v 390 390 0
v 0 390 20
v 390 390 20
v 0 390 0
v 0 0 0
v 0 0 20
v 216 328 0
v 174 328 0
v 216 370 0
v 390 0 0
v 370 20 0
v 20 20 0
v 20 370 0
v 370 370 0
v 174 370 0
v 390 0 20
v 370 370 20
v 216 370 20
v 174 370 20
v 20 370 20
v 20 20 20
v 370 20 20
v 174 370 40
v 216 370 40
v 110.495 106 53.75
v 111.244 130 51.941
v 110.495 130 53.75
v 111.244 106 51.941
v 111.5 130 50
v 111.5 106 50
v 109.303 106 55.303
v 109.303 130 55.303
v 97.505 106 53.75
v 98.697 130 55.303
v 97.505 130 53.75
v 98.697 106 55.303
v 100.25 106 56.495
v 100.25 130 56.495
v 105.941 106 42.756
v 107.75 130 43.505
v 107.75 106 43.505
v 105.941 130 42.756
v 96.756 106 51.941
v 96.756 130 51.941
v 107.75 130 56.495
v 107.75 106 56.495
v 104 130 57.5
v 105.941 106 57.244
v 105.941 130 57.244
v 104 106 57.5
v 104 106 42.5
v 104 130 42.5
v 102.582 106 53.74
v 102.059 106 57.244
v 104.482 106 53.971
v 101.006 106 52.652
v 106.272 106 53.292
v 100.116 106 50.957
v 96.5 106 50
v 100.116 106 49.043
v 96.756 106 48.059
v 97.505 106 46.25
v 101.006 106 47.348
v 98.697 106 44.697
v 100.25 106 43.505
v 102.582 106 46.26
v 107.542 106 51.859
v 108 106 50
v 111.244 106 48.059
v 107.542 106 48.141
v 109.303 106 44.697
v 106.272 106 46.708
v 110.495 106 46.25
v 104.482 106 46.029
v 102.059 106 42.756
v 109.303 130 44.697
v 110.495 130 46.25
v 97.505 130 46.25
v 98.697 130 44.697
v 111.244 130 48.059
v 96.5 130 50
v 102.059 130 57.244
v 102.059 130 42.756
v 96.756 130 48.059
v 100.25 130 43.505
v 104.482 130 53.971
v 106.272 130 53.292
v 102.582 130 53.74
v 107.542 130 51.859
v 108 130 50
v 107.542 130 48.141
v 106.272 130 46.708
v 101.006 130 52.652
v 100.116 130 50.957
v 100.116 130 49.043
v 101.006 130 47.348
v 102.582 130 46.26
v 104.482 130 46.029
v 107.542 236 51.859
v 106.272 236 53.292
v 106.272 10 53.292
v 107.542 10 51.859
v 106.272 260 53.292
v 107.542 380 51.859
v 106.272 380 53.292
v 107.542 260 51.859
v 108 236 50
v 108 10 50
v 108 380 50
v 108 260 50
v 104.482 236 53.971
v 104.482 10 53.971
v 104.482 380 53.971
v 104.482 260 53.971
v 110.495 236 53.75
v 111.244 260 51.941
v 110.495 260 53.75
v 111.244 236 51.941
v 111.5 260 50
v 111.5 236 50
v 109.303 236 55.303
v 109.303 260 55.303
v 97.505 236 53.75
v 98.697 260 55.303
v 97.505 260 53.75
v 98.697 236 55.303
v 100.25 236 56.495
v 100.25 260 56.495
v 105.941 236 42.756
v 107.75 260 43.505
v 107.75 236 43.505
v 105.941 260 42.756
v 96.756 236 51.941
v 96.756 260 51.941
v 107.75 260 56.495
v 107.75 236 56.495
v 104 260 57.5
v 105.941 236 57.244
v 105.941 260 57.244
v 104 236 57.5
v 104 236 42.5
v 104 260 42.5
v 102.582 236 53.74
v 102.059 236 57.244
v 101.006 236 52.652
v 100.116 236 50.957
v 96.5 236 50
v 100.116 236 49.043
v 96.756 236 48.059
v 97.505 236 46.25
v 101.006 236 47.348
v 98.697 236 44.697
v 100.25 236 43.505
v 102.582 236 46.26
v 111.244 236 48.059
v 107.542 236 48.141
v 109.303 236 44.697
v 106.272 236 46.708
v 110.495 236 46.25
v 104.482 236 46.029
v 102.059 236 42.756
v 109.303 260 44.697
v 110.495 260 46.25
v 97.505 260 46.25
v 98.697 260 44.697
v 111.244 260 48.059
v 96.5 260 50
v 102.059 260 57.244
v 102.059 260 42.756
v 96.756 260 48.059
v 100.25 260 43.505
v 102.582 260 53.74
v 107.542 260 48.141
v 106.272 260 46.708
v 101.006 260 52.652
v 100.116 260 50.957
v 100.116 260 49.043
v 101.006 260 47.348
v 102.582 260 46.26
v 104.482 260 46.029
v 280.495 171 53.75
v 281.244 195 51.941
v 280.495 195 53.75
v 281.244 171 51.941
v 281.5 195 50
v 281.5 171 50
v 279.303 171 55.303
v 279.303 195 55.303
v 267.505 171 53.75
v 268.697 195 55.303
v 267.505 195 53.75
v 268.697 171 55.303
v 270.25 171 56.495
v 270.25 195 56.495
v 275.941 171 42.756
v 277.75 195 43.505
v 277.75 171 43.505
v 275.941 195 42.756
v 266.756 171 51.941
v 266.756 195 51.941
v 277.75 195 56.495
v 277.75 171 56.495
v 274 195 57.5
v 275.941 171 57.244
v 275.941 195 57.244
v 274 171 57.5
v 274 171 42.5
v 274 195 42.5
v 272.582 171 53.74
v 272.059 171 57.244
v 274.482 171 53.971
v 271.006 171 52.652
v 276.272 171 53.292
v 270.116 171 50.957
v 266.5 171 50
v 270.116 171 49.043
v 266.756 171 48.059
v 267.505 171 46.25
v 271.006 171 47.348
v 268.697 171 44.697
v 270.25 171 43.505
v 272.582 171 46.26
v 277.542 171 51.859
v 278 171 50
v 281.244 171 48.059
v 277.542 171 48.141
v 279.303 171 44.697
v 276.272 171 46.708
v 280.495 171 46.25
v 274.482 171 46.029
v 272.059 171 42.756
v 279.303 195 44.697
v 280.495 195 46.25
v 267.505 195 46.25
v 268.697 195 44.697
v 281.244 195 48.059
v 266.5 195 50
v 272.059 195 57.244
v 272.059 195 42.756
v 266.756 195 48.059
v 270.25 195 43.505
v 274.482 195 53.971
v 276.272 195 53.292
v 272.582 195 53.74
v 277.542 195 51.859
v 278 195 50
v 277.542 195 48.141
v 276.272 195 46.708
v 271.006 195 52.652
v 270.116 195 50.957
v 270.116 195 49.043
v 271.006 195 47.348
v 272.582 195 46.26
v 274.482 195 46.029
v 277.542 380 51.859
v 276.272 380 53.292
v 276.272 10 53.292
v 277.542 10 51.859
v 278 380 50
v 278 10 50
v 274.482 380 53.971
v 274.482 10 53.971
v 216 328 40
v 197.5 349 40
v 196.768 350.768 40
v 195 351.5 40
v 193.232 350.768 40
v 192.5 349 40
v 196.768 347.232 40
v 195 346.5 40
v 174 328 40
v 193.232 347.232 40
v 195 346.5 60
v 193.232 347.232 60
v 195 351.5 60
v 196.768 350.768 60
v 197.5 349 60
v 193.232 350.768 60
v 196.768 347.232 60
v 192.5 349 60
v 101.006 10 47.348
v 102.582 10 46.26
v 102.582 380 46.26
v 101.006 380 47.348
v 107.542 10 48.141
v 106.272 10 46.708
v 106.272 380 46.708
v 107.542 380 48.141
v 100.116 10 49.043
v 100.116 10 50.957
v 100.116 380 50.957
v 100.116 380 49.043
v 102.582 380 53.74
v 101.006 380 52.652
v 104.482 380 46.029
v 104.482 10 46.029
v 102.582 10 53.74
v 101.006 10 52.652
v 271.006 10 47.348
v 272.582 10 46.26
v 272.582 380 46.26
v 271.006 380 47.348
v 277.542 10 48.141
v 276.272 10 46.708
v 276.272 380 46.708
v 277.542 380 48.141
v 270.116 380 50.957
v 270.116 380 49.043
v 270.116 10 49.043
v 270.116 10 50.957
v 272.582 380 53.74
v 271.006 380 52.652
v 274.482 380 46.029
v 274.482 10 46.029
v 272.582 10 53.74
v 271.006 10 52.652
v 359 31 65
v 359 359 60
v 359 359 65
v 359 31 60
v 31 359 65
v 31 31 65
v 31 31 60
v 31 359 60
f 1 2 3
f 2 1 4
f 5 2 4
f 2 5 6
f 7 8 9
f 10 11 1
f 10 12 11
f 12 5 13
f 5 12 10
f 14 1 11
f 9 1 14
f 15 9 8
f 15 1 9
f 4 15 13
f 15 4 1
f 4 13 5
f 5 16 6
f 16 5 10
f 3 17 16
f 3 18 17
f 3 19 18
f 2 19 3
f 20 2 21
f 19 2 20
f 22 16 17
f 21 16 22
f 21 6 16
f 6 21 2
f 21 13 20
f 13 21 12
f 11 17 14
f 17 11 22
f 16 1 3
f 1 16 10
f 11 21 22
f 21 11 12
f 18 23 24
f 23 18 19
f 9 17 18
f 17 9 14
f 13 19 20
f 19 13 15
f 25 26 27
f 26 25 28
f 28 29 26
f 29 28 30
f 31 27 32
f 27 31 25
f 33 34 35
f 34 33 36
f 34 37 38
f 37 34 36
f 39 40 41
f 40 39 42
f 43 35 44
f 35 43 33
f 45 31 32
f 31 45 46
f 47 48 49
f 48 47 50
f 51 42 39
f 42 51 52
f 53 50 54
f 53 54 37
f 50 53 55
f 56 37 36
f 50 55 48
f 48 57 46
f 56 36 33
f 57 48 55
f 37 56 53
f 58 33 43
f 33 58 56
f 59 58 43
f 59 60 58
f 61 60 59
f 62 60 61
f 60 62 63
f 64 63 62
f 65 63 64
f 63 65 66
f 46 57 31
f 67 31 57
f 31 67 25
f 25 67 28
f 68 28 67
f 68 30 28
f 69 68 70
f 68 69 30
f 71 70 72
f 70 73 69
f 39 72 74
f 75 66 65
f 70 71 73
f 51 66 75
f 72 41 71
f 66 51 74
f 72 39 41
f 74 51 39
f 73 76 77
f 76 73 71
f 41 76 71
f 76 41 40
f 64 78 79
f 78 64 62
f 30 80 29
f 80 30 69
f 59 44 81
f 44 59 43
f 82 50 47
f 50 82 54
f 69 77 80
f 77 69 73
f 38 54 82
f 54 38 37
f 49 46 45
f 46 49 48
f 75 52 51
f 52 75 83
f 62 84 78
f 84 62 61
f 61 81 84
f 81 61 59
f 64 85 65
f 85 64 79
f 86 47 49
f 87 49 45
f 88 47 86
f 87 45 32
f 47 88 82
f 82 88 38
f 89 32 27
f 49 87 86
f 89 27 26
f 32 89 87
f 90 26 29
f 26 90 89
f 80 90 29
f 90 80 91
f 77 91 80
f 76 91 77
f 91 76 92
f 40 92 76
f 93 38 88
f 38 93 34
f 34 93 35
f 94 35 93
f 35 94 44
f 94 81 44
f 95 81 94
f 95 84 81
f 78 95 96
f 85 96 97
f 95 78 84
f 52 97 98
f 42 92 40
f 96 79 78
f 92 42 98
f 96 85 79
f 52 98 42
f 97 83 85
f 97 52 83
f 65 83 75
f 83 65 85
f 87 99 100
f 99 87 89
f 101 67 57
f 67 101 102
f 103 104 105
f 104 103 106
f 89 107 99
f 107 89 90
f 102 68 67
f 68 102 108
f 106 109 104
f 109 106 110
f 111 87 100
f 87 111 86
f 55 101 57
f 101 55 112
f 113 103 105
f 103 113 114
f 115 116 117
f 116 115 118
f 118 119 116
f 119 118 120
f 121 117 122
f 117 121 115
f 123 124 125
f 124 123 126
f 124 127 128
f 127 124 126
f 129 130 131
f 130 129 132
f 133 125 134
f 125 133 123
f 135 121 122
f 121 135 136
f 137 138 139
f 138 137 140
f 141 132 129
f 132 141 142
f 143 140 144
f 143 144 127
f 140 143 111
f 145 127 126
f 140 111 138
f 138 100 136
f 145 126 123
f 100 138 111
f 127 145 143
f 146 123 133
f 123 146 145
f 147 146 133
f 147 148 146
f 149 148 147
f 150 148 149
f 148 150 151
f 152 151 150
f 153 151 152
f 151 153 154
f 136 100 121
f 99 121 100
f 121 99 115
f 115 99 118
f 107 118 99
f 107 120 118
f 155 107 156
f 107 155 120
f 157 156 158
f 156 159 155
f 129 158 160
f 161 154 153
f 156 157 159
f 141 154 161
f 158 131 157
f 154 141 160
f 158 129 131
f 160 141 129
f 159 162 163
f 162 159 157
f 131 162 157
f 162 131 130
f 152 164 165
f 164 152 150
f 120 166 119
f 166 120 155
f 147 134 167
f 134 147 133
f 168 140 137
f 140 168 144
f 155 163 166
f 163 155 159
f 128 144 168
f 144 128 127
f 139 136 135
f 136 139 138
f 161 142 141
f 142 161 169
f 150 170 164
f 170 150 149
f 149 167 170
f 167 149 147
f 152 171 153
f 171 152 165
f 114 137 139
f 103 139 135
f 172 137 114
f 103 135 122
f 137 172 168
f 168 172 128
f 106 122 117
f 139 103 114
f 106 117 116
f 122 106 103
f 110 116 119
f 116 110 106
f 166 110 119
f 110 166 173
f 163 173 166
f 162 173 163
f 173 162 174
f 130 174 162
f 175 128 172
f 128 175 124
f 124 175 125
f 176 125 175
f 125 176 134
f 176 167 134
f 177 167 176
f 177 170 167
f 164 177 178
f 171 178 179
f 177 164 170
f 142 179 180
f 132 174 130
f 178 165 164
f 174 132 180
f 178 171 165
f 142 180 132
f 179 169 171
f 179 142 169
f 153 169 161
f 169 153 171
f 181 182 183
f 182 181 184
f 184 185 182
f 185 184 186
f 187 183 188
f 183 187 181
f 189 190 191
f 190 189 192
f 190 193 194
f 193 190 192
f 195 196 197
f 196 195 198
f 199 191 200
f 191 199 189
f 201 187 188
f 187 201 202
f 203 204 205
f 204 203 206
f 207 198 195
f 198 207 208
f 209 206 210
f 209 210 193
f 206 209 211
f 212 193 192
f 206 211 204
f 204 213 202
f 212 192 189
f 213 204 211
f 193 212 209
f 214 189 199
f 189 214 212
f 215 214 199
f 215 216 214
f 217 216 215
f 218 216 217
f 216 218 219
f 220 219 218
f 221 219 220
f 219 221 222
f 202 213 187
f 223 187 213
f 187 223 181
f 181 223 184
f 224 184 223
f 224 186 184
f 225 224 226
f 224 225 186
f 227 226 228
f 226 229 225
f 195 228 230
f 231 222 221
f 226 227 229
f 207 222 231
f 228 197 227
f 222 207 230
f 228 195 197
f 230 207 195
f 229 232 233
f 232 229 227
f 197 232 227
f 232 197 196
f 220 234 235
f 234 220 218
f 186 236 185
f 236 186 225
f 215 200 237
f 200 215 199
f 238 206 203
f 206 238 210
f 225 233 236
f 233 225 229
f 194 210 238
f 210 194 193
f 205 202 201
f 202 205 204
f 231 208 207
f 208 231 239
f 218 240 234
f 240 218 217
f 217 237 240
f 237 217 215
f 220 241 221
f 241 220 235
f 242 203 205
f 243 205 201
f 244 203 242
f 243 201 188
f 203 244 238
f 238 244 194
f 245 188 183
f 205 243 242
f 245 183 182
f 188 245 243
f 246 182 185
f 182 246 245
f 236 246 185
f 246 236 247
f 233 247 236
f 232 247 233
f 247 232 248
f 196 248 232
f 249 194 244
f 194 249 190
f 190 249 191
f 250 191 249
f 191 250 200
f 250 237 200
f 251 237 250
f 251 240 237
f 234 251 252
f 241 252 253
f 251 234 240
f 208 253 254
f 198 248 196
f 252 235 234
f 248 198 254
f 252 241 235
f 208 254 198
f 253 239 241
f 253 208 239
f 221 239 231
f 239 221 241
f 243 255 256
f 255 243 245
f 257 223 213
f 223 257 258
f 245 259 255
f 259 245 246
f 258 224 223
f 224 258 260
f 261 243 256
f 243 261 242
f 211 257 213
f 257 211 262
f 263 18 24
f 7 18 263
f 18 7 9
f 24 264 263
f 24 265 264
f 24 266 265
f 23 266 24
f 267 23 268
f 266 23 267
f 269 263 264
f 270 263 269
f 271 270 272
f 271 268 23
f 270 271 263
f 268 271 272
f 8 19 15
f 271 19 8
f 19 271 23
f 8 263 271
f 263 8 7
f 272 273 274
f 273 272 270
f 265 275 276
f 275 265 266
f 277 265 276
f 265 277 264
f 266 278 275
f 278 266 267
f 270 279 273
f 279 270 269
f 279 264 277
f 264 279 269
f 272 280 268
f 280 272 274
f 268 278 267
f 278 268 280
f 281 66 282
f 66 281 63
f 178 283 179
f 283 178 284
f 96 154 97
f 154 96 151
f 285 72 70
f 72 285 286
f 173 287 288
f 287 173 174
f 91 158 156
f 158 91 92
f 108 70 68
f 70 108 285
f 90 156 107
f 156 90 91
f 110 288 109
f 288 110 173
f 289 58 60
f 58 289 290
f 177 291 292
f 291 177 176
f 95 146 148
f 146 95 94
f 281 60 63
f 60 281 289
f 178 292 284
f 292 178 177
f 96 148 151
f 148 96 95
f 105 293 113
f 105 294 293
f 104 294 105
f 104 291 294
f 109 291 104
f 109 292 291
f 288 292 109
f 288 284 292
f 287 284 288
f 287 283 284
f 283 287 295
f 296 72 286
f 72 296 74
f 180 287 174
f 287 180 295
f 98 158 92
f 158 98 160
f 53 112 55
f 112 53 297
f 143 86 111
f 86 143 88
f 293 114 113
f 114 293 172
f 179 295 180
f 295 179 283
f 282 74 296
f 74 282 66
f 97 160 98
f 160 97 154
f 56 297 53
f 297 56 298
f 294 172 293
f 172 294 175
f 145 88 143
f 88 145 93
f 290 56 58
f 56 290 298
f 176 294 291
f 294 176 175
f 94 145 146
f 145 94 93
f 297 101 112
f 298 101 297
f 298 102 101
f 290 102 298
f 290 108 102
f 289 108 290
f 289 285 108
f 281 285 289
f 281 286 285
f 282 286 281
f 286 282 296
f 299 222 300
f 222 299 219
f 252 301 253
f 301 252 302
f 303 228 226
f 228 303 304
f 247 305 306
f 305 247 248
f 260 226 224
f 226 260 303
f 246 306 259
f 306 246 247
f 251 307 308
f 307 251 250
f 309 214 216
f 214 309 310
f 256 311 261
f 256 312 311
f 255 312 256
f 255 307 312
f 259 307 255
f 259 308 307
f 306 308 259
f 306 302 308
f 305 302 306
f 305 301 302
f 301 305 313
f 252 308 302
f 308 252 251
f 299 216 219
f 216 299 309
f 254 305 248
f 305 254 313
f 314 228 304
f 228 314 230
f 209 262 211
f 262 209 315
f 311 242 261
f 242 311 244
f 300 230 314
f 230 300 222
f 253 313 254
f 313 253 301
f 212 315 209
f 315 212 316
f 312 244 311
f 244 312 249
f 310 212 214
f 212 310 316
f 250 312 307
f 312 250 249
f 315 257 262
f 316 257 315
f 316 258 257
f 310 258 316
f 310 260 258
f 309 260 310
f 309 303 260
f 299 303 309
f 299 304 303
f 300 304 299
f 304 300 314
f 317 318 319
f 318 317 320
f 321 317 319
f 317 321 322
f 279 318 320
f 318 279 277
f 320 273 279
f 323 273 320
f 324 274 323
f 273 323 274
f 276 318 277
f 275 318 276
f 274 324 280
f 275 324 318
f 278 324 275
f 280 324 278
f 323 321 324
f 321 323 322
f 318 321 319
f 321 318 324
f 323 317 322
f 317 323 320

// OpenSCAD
module rod(dia=8, length=300) {
    cylinder(length, dia/2, dia/2);
}

module bearing(outer=15,inner=8, length=24) {
    difference() {
        cylinder(length, outer, outer);
        cylinder(length, inner, inner);
    }
}

module lm8uu(){
    bearing(15/2,8/2,24);
}


module profile(x=20, y=20, z=300){
    cube([x,y,z]);
}

module frame_lower(){
    color("Fuchsia") translate([0,0,20]) rotate([-90,0,0]) profile(z=390);
    color("Fuchsia") translate([370,0,20]) rotate([-90,0,0]) profile(z=390);
    translate([20,0,20]) rotate([0,90,0]) profile(z=350);
    translate([20,370,20]) rotate([0,90,0]) profile(z=350);
}


module nema17(){
    union(){
        cube([42, 42, 40]);
        translate([21,21,40]) cylinder(24,2.5,2.5);
    }
}

module heatbed(){
    cube([328,328, 5]);
}

frame_lower();

//-- Y AXIS
color([0,1,1]) translate([100+4,10,50]) rotate([-90,0,0]) rod(length=370);
translate([100+4,130,50]) rotate([90,0,0]) lm8uu();
translate([100+4,260,50]) rotate([90,0,0]) lm8uu();
color([0,1,1]) translate([270+4,10,50]) rotate([-90,0,0]) rod(length=370);
translate([270+4,195,50]) rotate([90,0,0]) lm8uu();

translate([390/2-21 , 390-20-42, 0]) nema17();

translate([390/2-328/2 , 390/2-328/2, 60]) heatbed();
